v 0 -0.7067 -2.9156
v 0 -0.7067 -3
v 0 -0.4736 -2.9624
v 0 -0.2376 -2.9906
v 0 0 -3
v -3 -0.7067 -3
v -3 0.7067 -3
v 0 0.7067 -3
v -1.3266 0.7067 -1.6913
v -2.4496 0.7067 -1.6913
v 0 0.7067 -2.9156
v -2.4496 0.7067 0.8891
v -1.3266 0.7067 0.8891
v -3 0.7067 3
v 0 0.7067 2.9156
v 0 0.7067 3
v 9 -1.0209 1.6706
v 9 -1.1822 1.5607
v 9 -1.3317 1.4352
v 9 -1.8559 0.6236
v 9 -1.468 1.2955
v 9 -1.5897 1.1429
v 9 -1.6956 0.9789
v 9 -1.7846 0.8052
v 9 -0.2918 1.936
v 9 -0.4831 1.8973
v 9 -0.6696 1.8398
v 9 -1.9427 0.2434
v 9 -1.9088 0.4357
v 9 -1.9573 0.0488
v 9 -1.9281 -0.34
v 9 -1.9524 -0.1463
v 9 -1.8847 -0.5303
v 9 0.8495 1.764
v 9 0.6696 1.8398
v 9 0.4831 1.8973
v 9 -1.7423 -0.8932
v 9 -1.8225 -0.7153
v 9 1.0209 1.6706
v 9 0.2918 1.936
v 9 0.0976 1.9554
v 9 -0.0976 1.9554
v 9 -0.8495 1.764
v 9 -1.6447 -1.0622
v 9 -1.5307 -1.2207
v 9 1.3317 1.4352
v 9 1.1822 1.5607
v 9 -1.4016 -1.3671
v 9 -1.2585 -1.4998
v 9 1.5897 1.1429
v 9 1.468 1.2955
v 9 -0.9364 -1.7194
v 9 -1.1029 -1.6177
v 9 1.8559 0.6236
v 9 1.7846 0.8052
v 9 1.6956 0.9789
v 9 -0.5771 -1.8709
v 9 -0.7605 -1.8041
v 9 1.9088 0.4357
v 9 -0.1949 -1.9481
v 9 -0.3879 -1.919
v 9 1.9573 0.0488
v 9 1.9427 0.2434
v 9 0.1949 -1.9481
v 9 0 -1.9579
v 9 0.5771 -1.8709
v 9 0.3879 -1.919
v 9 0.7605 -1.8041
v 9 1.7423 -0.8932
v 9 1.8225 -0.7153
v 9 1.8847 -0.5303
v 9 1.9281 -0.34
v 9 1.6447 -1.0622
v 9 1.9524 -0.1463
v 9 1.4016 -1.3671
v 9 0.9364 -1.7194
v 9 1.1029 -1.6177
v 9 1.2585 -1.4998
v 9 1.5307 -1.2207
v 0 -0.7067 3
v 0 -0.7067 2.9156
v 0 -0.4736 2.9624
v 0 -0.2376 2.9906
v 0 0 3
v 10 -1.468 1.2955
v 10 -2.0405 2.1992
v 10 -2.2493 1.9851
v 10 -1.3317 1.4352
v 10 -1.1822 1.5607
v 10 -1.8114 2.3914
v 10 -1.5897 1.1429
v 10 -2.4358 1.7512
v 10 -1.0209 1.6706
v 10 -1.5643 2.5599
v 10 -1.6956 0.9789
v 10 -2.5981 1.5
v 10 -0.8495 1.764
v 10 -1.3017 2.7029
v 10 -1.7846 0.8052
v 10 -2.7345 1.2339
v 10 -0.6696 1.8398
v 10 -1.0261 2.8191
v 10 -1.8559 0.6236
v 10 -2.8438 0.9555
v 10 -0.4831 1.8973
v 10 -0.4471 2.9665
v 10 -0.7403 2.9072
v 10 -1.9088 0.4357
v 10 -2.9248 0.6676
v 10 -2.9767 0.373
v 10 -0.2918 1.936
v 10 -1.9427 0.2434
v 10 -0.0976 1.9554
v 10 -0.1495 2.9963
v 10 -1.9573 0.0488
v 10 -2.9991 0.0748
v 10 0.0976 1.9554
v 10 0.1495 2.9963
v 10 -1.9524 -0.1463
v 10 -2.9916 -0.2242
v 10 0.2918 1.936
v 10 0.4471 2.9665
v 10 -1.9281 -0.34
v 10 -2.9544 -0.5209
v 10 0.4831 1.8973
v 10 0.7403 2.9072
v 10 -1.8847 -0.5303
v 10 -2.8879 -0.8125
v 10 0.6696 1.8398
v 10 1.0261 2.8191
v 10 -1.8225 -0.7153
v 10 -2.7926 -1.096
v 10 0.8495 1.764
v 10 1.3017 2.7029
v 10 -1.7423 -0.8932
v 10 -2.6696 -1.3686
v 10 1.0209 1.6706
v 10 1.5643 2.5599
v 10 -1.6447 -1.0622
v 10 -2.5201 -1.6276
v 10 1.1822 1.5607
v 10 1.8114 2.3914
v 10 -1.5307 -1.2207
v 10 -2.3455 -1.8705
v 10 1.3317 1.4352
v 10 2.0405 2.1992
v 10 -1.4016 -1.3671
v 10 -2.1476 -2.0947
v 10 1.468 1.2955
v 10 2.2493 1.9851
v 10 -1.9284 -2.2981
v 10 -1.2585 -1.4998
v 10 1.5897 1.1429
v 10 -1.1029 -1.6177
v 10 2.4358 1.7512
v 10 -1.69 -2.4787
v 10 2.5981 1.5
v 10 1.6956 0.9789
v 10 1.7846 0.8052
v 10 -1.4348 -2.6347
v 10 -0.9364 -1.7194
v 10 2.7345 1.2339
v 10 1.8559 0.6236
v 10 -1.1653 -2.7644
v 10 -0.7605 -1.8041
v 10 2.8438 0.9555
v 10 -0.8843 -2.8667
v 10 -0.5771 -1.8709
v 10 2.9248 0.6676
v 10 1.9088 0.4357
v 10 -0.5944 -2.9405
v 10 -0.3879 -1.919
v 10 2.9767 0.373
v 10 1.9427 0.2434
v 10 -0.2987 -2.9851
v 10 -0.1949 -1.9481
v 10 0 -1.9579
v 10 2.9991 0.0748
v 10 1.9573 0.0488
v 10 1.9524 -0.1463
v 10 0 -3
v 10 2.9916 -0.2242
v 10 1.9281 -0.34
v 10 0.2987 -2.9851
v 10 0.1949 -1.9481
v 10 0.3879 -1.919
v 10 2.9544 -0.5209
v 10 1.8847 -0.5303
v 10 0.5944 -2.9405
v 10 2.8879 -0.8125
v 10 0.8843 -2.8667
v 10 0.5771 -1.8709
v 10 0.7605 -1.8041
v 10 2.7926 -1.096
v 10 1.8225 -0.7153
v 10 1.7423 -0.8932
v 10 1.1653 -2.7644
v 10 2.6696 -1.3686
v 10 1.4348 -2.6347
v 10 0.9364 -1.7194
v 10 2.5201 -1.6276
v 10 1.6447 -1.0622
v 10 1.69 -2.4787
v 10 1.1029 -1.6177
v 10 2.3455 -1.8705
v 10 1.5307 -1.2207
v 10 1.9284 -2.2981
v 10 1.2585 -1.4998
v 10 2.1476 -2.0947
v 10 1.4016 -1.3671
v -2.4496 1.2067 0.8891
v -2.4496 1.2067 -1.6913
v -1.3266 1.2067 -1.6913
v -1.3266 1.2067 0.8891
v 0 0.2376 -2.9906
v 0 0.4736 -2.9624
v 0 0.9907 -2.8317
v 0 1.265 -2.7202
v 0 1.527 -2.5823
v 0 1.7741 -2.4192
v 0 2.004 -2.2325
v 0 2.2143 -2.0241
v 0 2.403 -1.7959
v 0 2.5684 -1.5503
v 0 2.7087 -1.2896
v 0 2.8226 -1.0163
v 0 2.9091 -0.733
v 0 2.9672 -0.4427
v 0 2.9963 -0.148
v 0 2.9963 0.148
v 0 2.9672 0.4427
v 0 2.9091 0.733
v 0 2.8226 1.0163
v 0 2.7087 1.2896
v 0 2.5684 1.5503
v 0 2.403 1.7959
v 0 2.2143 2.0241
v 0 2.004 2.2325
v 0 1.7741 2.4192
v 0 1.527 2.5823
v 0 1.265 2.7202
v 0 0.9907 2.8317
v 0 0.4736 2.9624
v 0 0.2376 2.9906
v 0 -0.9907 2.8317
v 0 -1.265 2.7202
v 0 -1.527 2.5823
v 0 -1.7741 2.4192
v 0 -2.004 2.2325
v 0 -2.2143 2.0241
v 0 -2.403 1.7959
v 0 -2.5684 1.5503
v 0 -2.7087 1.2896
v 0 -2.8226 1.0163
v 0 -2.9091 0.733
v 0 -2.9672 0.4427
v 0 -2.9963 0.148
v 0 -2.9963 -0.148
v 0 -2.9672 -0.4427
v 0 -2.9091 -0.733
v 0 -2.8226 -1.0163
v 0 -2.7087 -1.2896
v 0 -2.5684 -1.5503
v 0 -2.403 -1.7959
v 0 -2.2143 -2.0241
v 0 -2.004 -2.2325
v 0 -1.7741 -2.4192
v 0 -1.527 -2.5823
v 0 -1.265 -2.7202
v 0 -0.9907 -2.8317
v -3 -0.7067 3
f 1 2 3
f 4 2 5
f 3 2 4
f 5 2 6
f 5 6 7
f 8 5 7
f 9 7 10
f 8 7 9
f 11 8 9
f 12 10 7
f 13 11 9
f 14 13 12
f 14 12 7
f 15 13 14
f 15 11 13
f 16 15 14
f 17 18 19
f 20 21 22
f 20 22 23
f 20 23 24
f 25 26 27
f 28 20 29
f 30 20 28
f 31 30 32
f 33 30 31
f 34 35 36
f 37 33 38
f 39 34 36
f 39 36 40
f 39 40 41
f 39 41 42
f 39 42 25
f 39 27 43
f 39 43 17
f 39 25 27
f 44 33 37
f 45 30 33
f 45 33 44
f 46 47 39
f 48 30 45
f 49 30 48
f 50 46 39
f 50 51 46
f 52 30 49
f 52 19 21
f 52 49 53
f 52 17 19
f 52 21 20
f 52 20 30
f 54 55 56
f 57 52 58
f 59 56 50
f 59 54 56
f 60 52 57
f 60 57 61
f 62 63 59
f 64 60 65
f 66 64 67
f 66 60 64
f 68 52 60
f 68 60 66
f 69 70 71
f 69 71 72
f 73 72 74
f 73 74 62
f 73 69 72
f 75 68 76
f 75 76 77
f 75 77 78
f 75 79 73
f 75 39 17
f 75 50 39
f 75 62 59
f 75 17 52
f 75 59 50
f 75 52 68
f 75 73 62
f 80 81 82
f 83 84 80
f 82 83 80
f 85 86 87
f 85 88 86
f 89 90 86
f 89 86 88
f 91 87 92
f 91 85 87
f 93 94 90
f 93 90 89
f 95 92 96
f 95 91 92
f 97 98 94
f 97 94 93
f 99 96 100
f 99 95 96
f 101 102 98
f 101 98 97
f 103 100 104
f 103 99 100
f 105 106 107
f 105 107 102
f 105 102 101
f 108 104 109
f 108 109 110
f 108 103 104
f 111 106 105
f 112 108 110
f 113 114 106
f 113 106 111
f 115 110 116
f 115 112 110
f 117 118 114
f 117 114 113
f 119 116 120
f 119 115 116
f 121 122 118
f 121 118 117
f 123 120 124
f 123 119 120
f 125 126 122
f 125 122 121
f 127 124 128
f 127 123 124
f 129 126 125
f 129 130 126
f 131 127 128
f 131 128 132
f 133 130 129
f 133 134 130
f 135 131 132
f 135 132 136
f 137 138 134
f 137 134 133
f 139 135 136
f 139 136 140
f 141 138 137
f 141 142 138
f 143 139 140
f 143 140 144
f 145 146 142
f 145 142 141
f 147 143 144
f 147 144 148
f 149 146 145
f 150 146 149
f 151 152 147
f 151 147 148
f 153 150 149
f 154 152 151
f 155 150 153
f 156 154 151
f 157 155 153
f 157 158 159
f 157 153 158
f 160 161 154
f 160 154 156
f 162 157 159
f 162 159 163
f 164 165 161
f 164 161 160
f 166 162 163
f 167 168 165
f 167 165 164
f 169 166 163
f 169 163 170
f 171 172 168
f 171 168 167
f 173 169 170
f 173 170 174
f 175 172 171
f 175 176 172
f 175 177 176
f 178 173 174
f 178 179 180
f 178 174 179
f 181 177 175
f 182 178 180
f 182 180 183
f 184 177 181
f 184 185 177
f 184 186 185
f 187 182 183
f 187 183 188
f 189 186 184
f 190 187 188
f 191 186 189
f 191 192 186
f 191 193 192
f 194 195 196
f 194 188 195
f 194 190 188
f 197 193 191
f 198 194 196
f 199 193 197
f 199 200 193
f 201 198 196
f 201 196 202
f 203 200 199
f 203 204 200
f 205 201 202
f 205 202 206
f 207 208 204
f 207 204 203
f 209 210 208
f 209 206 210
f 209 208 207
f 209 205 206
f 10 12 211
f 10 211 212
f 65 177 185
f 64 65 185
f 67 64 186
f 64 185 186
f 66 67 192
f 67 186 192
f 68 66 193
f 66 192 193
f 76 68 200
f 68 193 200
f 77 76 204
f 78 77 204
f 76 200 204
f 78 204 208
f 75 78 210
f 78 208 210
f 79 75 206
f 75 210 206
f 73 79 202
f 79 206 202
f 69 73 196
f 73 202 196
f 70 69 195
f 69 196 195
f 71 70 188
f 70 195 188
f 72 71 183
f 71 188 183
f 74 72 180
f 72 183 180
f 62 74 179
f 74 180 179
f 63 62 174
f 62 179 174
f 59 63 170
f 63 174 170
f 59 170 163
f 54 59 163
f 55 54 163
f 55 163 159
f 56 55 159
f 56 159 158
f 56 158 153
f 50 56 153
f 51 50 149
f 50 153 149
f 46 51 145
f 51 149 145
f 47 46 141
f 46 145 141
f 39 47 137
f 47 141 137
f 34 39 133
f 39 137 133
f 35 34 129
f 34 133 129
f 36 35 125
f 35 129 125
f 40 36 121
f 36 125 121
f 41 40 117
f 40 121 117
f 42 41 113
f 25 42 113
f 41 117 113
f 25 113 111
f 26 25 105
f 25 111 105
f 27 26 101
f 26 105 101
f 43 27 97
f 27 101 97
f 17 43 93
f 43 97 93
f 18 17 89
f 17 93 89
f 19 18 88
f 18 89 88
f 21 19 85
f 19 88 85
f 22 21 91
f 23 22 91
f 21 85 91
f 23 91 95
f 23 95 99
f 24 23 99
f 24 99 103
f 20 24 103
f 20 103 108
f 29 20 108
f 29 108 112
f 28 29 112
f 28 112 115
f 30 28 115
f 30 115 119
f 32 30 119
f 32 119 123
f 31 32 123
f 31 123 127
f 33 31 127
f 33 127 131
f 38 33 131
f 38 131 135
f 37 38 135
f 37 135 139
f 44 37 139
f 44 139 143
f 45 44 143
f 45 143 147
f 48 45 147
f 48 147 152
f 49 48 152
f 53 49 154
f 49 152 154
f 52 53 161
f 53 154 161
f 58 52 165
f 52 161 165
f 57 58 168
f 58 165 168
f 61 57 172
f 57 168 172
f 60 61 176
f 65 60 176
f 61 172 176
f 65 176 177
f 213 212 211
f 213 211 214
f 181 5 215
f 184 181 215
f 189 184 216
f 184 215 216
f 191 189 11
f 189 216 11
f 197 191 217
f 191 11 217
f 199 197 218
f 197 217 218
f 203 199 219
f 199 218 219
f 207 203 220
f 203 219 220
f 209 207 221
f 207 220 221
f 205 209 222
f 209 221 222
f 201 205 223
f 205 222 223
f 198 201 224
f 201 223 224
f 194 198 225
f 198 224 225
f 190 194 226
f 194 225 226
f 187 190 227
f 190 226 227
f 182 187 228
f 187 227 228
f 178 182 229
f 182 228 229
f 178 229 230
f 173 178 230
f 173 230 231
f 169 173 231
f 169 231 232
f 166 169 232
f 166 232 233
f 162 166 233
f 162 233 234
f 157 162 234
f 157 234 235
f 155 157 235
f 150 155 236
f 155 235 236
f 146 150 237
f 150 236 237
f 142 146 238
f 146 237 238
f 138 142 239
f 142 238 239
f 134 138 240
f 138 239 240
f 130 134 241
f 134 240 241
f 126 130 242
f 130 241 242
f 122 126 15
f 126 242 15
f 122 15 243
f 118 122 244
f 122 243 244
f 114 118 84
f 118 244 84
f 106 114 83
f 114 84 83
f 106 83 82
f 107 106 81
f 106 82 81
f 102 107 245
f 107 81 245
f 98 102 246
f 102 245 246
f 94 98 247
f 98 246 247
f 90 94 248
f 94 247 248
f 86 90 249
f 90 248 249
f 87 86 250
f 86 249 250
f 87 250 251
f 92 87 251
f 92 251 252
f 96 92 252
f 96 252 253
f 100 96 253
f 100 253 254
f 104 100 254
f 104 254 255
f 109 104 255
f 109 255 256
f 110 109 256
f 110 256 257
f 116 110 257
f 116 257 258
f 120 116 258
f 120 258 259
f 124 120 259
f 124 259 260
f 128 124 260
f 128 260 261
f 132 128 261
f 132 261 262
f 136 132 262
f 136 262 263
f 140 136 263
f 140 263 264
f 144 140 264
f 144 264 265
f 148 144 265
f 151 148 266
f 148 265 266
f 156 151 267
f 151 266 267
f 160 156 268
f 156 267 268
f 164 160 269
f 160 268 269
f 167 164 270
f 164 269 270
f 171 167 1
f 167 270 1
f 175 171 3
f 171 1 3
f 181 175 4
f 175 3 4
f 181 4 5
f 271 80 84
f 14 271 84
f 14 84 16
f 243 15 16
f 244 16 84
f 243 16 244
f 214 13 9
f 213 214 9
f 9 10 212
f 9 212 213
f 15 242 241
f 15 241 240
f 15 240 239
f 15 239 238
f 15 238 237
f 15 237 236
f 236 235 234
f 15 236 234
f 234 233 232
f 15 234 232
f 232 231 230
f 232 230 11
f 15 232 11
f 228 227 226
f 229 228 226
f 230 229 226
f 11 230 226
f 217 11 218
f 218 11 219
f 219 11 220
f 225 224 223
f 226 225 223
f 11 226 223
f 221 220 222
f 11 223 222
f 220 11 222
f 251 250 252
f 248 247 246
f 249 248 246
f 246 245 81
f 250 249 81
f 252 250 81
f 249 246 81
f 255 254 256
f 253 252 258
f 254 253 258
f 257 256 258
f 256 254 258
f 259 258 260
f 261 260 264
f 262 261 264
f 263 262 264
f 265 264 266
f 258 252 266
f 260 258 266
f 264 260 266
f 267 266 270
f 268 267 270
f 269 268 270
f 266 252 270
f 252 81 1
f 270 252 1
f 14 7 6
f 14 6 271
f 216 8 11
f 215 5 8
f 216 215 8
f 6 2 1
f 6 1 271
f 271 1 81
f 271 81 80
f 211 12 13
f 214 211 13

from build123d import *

# Parameters (mm, degrees)
SKETCH1_R           = 3
BOSS_EXTRUDE1_DEPTH = 10
SKETCH2_R           = 1.957866775
CUT_EXTRUDE1_DEPTH  = 1
SKETCH3_W           = 6
SKETCH3_H           = 1.413467244
BOSS_EXTRUDE2_DEPTH = 3
SKETCH4_W           = 1.123078493
SKETCH4_H           = 2.580406537
BOSS_EXTRUDE3_DEPTH = 0.5


with BuildPart() as part:
    # Sketch1 → Boss-Extrude1 (new body)
    with BuildSketch(Plane(origin=(0, 0, 0), x_dir=(0, 0, -1), z_dir=(1, 0, 0))):
        Circle(SKETCH1_R)
    extrude(amount=BOSS_EXTRUDE1_DEPTH)

    # Sketch2 → Cut-Extrude1 (cut)
    with BuildSketch(Plane(origin=(10, 0, 0), x_dir=(0, 0, -1), z_dir=(1, 0, 0))):
        Circle(SKETCH2_R)
    extrude(amount=-CUT_EXTRUDE1_DEPTH, mode=Mode.SUBTRACT)

    # Sketch3 → Boss-Extrude2 (add)
    with BuildSketch(Plane.ZY):
        Rectangle(SKETCH3_W, SKETCH3_H)
    extrude(amount=BOSS_EXTRUDE2_DEPTH)

    # Sketch4 → Boss-Extrude3 (add)
    with BuildSketch(Plane(origin=(0, 0.706733622, 0), x_dir=(1, 0, 0), z_dir=(0, 1, 0))):
        with Locations((-1.88810277, 0.401099462)):
            Rectangle(SKETCH4_W, SKETCH4_H)
    extrude(amount=BOSS_EXTRUDE3_DEPTH)


solid = part.part
